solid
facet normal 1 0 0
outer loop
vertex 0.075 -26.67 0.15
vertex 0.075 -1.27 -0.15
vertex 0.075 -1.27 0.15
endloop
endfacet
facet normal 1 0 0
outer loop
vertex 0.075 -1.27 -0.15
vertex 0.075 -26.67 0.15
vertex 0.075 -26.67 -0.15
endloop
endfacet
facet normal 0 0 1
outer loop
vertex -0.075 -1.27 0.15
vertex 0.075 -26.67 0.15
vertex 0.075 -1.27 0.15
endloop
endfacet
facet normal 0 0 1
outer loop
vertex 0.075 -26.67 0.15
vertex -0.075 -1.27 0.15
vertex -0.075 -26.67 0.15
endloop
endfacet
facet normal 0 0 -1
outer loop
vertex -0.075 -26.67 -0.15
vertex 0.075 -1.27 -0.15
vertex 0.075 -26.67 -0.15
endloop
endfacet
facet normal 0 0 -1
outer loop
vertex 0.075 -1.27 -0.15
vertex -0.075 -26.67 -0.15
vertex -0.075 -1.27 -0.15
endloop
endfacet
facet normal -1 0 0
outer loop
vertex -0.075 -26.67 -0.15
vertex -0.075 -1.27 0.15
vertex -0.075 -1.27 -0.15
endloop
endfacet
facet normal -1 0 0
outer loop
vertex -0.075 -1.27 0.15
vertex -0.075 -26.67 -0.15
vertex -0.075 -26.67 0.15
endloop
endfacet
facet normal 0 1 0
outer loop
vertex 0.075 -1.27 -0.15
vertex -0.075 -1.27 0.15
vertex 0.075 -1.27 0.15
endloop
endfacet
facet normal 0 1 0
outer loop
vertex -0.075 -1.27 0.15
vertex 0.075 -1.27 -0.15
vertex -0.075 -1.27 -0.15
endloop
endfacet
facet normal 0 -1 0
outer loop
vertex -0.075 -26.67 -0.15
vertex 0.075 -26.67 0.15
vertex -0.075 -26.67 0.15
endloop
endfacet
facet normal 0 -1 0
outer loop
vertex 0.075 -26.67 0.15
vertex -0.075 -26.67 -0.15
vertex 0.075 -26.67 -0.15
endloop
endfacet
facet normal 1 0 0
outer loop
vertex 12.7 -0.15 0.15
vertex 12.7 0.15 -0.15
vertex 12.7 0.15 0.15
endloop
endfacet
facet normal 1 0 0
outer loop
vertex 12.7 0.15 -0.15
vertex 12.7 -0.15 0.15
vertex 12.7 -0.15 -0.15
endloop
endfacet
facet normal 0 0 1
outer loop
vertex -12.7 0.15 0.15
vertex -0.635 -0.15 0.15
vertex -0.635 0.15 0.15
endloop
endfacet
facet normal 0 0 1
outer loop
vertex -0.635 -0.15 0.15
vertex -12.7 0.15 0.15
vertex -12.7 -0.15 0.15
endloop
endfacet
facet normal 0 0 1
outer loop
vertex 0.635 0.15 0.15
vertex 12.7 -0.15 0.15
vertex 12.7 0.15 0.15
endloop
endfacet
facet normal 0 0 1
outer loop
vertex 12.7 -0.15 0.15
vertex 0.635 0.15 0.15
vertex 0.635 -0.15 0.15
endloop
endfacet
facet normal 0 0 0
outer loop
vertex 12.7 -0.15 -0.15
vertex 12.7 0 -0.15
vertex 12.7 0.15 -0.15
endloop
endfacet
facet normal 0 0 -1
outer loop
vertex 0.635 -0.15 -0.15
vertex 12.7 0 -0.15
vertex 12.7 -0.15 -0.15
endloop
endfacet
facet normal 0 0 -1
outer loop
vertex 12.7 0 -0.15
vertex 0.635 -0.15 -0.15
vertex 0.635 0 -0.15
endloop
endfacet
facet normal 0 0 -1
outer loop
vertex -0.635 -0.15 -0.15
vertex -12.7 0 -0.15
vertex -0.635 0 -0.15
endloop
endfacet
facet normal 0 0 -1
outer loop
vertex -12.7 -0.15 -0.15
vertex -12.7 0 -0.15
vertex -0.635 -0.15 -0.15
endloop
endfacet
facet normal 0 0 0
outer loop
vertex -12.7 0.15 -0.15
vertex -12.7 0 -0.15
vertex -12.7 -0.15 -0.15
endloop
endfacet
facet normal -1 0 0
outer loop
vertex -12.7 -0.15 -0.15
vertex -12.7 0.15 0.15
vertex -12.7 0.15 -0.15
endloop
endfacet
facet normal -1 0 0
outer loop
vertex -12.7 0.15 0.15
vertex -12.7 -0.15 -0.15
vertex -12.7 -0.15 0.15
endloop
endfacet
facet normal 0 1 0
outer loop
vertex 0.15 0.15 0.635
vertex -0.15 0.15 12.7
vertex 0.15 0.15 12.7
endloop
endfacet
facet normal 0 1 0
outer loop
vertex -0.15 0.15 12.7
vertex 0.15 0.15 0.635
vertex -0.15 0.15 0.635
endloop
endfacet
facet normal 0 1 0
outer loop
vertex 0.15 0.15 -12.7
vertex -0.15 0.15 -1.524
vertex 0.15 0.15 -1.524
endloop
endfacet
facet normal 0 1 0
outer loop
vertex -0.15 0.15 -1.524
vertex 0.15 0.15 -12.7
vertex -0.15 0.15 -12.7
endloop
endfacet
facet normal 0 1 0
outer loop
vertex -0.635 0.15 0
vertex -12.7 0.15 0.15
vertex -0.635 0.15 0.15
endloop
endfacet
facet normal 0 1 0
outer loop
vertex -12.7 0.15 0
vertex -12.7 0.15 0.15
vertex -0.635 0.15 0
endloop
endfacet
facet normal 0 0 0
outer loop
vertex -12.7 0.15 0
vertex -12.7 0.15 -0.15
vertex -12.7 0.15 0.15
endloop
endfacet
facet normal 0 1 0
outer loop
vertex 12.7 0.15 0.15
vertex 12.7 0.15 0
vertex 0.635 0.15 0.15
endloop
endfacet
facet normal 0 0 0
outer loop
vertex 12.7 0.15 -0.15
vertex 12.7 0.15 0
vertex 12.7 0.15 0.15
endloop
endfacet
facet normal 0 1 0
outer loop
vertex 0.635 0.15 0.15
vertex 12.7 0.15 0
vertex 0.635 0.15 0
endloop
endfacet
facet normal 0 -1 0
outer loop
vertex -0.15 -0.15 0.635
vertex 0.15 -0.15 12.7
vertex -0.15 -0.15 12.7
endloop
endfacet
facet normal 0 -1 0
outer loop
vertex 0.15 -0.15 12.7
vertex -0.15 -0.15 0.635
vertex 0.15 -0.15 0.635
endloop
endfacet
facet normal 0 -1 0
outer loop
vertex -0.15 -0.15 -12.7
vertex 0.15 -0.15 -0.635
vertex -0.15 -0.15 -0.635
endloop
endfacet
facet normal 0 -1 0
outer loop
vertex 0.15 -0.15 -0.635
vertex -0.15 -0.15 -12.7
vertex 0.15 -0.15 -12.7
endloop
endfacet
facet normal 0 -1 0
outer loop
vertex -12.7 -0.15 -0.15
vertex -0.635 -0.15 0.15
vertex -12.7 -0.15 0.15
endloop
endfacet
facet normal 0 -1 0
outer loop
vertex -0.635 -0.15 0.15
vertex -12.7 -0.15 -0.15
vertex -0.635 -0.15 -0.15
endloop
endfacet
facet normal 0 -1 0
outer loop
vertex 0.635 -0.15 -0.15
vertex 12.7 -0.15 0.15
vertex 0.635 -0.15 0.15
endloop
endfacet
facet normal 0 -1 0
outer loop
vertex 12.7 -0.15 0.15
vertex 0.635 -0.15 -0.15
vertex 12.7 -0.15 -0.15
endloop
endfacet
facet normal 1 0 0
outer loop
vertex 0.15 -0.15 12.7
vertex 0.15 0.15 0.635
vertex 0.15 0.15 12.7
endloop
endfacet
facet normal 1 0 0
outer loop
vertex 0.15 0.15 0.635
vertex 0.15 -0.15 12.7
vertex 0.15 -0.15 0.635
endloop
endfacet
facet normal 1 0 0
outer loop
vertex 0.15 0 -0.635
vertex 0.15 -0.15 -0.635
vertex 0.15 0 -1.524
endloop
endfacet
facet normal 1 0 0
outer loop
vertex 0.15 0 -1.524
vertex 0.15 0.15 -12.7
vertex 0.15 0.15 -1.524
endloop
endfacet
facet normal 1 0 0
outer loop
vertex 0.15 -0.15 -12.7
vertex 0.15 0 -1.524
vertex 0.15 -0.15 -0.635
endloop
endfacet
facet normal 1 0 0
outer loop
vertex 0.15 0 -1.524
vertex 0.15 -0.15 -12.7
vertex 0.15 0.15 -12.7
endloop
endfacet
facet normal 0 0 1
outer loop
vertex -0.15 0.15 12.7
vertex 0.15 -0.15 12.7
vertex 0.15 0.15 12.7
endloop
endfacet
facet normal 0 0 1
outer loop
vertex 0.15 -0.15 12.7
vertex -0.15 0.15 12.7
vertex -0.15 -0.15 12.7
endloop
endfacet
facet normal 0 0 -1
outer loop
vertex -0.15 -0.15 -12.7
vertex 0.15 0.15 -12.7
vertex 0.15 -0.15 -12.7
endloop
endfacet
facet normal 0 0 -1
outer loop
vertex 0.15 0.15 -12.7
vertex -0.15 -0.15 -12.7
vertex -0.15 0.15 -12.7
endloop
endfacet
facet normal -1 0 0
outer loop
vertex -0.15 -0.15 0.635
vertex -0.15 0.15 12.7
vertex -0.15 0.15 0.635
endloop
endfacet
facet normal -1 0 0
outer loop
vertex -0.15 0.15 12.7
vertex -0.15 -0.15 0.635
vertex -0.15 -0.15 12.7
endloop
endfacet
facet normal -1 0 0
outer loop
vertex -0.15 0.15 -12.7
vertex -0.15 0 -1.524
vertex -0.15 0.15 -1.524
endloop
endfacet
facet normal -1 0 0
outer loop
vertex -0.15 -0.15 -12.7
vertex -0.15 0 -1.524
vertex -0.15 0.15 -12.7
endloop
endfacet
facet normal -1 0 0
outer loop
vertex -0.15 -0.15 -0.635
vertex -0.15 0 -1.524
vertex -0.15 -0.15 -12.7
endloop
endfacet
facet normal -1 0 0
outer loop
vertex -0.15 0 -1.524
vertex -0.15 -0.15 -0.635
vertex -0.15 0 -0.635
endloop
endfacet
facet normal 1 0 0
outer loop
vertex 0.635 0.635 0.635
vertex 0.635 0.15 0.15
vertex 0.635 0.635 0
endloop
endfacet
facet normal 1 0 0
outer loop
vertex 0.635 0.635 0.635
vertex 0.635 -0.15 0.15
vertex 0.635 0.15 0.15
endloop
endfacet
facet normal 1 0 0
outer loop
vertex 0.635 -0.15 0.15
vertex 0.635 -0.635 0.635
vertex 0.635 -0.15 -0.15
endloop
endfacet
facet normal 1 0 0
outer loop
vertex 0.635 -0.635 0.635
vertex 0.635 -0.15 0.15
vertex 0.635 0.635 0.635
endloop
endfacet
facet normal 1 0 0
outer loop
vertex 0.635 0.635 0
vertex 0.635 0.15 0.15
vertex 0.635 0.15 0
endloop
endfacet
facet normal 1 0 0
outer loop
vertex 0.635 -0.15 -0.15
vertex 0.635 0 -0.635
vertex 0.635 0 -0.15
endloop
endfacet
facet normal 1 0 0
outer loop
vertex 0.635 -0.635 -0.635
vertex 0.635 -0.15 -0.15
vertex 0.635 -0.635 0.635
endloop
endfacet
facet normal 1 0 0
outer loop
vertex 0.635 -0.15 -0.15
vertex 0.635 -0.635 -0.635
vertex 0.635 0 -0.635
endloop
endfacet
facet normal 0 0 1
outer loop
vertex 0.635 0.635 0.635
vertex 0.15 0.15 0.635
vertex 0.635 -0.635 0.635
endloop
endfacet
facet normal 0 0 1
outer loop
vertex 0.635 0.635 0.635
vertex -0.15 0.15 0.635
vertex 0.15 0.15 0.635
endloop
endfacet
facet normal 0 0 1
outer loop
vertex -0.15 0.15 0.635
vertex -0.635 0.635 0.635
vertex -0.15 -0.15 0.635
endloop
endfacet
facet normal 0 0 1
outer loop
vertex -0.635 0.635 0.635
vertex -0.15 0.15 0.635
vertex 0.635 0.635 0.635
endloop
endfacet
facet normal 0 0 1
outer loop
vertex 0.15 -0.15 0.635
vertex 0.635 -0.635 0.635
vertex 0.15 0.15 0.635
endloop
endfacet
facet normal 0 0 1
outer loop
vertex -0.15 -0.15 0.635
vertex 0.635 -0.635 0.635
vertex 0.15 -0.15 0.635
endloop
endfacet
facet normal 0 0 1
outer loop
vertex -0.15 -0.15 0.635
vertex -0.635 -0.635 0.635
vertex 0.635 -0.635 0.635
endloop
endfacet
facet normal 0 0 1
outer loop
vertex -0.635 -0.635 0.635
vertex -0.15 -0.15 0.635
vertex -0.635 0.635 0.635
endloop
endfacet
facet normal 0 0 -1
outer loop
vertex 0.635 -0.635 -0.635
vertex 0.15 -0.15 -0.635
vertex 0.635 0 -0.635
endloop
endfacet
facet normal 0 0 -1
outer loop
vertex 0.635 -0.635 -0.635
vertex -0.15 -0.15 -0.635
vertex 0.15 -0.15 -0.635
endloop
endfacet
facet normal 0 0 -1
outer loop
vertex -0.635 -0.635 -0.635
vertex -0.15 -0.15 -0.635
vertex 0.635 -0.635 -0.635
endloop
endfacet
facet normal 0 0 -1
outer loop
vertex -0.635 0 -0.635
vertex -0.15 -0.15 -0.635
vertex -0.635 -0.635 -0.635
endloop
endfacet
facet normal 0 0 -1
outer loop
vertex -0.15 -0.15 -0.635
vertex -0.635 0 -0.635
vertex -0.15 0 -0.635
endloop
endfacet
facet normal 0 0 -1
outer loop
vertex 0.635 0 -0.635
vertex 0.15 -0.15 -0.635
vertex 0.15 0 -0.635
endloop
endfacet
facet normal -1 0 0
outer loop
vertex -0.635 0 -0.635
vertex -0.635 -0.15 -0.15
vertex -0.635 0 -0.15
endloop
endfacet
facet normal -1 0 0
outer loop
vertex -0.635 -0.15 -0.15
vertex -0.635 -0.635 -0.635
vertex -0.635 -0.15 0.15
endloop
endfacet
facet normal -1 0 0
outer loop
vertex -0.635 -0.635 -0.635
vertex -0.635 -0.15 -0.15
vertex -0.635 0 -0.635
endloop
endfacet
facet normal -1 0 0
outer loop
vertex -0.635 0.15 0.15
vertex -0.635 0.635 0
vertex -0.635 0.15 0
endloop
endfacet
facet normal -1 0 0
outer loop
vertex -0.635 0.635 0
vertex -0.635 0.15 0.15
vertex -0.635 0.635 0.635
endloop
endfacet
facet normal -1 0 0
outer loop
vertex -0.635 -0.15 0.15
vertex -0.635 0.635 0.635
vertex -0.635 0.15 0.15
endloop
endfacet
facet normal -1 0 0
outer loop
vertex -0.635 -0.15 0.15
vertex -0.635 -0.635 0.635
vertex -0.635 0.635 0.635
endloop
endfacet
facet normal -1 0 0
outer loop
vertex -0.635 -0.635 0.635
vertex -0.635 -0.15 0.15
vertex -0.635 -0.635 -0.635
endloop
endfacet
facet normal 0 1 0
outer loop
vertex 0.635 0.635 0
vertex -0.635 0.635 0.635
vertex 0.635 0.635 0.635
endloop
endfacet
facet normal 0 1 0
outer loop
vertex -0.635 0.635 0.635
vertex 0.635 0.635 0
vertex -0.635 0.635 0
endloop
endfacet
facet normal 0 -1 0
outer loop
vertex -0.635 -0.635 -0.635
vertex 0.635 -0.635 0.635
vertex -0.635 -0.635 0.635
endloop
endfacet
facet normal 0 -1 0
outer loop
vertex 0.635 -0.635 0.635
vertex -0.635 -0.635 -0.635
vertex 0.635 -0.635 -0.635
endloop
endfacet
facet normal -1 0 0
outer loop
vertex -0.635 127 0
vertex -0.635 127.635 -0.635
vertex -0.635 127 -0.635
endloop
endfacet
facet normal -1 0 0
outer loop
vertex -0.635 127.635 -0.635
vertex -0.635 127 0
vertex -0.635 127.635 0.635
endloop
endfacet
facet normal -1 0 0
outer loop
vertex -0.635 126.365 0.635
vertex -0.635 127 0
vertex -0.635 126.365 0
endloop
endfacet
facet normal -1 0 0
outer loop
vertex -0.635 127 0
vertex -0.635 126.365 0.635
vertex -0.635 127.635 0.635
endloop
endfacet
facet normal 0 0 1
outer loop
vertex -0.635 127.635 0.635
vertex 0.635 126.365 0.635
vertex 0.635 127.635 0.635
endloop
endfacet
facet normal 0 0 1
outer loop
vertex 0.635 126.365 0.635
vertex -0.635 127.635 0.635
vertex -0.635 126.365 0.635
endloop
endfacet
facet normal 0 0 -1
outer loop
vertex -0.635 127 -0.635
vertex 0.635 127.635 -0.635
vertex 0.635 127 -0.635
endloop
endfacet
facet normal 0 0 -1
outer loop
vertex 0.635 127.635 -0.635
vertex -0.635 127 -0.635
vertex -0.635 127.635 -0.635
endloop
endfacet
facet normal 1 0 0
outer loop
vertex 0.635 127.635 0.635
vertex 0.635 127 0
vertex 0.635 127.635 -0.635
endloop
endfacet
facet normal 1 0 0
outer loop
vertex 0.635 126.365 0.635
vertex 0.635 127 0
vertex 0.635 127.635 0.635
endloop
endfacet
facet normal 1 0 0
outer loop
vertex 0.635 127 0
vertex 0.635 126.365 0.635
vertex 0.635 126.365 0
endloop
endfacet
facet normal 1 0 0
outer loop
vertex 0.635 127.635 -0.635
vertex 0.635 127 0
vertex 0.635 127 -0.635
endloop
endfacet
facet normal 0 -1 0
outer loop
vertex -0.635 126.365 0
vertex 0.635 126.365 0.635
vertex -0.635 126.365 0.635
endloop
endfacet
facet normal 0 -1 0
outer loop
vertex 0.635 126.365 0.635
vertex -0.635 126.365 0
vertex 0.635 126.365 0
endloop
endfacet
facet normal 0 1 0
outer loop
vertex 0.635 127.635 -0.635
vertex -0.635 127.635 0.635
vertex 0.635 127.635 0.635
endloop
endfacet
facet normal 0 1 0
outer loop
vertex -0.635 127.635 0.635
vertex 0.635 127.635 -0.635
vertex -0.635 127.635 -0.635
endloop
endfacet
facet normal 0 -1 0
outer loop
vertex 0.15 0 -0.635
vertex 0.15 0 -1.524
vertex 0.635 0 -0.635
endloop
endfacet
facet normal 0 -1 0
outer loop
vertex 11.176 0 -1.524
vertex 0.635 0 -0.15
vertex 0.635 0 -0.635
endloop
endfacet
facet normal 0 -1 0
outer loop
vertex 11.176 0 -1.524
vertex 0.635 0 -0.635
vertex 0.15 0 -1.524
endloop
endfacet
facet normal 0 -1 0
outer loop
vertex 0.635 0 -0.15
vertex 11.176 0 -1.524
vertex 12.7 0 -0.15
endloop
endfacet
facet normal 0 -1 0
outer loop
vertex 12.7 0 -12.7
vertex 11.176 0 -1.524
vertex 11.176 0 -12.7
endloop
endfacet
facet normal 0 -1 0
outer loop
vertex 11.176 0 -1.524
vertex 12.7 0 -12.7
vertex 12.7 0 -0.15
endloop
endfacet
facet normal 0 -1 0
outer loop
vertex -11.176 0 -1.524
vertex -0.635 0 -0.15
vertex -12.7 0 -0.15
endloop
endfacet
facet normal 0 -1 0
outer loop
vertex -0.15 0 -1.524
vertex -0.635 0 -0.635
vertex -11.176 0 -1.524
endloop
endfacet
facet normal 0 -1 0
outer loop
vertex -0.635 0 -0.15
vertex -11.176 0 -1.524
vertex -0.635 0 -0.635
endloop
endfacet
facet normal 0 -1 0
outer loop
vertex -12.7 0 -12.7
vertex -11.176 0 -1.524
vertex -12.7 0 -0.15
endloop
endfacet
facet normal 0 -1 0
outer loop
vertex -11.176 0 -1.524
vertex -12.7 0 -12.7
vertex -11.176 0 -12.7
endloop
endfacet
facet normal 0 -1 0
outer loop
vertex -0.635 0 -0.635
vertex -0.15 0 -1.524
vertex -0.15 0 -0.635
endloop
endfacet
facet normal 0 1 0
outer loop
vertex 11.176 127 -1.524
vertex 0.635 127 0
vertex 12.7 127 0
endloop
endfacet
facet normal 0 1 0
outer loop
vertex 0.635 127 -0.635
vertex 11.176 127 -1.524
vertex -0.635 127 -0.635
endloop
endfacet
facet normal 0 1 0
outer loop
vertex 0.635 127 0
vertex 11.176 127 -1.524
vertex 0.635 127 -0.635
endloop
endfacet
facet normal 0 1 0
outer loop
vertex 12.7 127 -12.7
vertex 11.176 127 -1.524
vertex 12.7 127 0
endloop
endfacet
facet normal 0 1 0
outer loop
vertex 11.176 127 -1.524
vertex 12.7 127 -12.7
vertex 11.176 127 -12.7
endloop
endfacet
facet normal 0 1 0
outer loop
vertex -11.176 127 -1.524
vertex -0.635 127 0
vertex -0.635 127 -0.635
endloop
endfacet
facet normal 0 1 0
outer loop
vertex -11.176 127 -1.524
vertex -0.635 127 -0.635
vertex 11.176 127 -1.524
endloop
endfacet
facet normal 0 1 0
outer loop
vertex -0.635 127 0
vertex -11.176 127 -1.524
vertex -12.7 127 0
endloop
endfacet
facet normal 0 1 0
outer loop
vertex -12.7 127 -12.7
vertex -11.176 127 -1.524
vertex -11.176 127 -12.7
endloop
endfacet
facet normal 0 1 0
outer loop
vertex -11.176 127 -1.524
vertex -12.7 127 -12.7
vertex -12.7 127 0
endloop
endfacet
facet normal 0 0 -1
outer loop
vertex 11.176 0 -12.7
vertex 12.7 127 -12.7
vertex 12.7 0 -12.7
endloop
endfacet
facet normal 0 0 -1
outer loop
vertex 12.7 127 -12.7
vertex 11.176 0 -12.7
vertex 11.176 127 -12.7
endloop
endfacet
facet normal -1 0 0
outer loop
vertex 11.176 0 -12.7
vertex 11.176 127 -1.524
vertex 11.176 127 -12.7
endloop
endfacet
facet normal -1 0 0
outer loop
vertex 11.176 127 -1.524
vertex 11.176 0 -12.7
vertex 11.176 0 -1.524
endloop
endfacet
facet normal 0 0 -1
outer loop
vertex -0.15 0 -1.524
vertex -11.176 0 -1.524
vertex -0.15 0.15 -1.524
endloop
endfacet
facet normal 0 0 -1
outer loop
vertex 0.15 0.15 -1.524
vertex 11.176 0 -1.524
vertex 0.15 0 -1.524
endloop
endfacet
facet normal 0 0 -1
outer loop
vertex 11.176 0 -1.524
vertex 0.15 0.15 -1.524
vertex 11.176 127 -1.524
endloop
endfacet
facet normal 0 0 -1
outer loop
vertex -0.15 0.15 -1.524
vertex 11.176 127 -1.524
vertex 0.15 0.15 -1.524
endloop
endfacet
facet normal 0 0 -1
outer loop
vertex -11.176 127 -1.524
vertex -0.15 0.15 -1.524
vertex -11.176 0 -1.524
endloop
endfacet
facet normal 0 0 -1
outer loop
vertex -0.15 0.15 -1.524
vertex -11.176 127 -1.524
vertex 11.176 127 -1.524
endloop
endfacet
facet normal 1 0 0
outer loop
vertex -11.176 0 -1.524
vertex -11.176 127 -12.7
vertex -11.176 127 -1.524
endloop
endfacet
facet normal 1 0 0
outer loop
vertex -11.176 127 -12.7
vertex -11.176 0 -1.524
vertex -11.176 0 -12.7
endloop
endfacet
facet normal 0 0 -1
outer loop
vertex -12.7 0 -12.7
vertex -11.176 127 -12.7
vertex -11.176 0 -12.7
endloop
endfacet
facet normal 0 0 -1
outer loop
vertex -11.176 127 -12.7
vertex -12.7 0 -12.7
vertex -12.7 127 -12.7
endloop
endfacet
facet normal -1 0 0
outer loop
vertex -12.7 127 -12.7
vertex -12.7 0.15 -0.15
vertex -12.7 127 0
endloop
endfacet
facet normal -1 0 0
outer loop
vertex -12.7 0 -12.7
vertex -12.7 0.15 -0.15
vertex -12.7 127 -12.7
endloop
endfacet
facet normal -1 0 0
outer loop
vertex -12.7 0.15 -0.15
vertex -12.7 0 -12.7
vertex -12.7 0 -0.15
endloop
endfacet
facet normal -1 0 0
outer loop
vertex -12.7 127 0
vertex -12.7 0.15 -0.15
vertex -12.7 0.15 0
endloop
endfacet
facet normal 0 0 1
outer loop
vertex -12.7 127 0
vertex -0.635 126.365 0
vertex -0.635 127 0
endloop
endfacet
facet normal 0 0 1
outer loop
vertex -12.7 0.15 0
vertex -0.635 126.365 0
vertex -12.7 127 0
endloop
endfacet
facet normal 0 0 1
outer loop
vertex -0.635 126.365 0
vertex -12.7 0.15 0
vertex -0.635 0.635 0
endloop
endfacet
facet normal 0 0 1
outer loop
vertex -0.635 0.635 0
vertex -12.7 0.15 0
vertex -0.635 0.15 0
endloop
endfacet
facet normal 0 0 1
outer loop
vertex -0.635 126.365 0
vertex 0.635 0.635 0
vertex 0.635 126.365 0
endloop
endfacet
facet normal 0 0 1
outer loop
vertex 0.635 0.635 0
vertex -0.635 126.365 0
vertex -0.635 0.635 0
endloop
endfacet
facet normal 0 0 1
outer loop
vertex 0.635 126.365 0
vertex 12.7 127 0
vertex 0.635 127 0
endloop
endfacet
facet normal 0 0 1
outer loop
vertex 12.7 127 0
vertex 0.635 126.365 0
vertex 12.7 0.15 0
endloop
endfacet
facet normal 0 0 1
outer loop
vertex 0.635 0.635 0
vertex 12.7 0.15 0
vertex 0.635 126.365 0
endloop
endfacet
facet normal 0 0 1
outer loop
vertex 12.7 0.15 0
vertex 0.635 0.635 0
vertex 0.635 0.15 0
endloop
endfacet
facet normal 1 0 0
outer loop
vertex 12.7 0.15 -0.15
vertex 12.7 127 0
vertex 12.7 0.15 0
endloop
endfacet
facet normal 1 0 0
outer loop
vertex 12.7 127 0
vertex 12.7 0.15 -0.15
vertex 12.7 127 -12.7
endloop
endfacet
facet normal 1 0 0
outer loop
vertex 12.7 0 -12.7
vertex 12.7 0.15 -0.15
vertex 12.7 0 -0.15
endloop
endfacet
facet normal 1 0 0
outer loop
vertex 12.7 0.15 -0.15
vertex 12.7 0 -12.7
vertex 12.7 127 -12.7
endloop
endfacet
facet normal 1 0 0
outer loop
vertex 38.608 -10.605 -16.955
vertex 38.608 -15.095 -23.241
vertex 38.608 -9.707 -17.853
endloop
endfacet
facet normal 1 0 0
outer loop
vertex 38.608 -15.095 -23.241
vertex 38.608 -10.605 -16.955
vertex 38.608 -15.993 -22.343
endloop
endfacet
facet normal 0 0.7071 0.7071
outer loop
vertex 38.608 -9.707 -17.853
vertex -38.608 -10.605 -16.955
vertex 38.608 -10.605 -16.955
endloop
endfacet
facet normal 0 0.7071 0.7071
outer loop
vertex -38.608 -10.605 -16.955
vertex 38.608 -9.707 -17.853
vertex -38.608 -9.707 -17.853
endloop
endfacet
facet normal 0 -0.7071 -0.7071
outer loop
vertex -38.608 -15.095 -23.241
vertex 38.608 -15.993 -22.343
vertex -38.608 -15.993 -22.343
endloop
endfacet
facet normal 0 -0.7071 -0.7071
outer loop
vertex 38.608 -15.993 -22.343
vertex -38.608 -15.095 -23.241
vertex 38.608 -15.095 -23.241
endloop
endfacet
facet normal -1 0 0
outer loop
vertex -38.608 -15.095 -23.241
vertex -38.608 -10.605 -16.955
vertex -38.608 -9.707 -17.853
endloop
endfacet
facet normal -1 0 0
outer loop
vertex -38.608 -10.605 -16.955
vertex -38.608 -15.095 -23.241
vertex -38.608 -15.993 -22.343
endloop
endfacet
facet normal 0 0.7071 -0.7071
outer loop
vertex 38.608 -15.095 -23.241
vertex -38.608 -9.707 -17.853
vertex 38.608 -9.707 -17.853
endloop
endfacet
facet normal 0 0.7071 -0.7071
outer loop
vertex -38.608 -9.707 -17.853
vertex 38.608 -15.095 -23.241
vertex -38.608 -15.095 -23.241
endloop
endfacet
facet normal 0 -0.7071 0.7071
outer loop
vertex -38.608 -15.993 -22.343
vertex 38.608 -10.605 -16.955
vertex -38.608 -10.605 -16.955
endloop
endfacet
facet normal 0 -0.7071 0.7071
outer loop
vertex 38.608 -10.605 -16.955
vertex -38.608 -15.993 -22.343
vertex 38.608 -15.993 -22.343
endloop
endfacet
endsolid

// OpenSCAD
include <../mo/mo.scad>

module moChannelExtrusion( spec, p = 0, info = false ) {
  color( Yellow ) {
    moPitch( 3 ) {
      linear_extrude( height = spec[ 0 ] ) {   
        polygon( [ [ -spec[1]/2, 0 ], [ spec[1]/2, 0 ], [ spec[1]/2,spec[2] ], [ spec[1]/2-spec[3],spec[2] ], [ spec[1]/2-spec[3],spec[3] ], 
                   [ -spec[1]/2+spec[3],spec[3] ], [ -spec[1]/2+spec[3],spec[2] ], [-spec[1]/2,spec[2] ] ] );       
      }
    }
  }
  
  if ( info ) {
    moPartOrigin();
    //echo( "SPEC:", spec );
    for ( i = [ 0 : 1 ] )
      moMoveTo( moChannelExtrusionPosition( i, spec ) )
        moPosition( i );
  }
  if ( $name )
    moPartLabel( parent_module( 1 ) );

}

function moChannelExtrusionPosition( p = 0, spec ) =
  ( p == 0 ) ?  [ [0, 0, 0], [0,0,1],0 ] : [ [0, spec[ 0 ], 0], [ 0,0,1],180 ];

demoSpec = [ 5 * in, 1 * in, 0.5 * in, 0.06 * in ];

moMoveOriginTo( moChannelExtrusionPosition( 0, demoSpec ) )
  moChannelExtrusion( demoSpec, 0, info = true, $name=true );

echo( moChannelExtrusionPosition( 0, demoSpec ) );
echo( moChannelExtrusionPosition( 1, demoSpec ) );
